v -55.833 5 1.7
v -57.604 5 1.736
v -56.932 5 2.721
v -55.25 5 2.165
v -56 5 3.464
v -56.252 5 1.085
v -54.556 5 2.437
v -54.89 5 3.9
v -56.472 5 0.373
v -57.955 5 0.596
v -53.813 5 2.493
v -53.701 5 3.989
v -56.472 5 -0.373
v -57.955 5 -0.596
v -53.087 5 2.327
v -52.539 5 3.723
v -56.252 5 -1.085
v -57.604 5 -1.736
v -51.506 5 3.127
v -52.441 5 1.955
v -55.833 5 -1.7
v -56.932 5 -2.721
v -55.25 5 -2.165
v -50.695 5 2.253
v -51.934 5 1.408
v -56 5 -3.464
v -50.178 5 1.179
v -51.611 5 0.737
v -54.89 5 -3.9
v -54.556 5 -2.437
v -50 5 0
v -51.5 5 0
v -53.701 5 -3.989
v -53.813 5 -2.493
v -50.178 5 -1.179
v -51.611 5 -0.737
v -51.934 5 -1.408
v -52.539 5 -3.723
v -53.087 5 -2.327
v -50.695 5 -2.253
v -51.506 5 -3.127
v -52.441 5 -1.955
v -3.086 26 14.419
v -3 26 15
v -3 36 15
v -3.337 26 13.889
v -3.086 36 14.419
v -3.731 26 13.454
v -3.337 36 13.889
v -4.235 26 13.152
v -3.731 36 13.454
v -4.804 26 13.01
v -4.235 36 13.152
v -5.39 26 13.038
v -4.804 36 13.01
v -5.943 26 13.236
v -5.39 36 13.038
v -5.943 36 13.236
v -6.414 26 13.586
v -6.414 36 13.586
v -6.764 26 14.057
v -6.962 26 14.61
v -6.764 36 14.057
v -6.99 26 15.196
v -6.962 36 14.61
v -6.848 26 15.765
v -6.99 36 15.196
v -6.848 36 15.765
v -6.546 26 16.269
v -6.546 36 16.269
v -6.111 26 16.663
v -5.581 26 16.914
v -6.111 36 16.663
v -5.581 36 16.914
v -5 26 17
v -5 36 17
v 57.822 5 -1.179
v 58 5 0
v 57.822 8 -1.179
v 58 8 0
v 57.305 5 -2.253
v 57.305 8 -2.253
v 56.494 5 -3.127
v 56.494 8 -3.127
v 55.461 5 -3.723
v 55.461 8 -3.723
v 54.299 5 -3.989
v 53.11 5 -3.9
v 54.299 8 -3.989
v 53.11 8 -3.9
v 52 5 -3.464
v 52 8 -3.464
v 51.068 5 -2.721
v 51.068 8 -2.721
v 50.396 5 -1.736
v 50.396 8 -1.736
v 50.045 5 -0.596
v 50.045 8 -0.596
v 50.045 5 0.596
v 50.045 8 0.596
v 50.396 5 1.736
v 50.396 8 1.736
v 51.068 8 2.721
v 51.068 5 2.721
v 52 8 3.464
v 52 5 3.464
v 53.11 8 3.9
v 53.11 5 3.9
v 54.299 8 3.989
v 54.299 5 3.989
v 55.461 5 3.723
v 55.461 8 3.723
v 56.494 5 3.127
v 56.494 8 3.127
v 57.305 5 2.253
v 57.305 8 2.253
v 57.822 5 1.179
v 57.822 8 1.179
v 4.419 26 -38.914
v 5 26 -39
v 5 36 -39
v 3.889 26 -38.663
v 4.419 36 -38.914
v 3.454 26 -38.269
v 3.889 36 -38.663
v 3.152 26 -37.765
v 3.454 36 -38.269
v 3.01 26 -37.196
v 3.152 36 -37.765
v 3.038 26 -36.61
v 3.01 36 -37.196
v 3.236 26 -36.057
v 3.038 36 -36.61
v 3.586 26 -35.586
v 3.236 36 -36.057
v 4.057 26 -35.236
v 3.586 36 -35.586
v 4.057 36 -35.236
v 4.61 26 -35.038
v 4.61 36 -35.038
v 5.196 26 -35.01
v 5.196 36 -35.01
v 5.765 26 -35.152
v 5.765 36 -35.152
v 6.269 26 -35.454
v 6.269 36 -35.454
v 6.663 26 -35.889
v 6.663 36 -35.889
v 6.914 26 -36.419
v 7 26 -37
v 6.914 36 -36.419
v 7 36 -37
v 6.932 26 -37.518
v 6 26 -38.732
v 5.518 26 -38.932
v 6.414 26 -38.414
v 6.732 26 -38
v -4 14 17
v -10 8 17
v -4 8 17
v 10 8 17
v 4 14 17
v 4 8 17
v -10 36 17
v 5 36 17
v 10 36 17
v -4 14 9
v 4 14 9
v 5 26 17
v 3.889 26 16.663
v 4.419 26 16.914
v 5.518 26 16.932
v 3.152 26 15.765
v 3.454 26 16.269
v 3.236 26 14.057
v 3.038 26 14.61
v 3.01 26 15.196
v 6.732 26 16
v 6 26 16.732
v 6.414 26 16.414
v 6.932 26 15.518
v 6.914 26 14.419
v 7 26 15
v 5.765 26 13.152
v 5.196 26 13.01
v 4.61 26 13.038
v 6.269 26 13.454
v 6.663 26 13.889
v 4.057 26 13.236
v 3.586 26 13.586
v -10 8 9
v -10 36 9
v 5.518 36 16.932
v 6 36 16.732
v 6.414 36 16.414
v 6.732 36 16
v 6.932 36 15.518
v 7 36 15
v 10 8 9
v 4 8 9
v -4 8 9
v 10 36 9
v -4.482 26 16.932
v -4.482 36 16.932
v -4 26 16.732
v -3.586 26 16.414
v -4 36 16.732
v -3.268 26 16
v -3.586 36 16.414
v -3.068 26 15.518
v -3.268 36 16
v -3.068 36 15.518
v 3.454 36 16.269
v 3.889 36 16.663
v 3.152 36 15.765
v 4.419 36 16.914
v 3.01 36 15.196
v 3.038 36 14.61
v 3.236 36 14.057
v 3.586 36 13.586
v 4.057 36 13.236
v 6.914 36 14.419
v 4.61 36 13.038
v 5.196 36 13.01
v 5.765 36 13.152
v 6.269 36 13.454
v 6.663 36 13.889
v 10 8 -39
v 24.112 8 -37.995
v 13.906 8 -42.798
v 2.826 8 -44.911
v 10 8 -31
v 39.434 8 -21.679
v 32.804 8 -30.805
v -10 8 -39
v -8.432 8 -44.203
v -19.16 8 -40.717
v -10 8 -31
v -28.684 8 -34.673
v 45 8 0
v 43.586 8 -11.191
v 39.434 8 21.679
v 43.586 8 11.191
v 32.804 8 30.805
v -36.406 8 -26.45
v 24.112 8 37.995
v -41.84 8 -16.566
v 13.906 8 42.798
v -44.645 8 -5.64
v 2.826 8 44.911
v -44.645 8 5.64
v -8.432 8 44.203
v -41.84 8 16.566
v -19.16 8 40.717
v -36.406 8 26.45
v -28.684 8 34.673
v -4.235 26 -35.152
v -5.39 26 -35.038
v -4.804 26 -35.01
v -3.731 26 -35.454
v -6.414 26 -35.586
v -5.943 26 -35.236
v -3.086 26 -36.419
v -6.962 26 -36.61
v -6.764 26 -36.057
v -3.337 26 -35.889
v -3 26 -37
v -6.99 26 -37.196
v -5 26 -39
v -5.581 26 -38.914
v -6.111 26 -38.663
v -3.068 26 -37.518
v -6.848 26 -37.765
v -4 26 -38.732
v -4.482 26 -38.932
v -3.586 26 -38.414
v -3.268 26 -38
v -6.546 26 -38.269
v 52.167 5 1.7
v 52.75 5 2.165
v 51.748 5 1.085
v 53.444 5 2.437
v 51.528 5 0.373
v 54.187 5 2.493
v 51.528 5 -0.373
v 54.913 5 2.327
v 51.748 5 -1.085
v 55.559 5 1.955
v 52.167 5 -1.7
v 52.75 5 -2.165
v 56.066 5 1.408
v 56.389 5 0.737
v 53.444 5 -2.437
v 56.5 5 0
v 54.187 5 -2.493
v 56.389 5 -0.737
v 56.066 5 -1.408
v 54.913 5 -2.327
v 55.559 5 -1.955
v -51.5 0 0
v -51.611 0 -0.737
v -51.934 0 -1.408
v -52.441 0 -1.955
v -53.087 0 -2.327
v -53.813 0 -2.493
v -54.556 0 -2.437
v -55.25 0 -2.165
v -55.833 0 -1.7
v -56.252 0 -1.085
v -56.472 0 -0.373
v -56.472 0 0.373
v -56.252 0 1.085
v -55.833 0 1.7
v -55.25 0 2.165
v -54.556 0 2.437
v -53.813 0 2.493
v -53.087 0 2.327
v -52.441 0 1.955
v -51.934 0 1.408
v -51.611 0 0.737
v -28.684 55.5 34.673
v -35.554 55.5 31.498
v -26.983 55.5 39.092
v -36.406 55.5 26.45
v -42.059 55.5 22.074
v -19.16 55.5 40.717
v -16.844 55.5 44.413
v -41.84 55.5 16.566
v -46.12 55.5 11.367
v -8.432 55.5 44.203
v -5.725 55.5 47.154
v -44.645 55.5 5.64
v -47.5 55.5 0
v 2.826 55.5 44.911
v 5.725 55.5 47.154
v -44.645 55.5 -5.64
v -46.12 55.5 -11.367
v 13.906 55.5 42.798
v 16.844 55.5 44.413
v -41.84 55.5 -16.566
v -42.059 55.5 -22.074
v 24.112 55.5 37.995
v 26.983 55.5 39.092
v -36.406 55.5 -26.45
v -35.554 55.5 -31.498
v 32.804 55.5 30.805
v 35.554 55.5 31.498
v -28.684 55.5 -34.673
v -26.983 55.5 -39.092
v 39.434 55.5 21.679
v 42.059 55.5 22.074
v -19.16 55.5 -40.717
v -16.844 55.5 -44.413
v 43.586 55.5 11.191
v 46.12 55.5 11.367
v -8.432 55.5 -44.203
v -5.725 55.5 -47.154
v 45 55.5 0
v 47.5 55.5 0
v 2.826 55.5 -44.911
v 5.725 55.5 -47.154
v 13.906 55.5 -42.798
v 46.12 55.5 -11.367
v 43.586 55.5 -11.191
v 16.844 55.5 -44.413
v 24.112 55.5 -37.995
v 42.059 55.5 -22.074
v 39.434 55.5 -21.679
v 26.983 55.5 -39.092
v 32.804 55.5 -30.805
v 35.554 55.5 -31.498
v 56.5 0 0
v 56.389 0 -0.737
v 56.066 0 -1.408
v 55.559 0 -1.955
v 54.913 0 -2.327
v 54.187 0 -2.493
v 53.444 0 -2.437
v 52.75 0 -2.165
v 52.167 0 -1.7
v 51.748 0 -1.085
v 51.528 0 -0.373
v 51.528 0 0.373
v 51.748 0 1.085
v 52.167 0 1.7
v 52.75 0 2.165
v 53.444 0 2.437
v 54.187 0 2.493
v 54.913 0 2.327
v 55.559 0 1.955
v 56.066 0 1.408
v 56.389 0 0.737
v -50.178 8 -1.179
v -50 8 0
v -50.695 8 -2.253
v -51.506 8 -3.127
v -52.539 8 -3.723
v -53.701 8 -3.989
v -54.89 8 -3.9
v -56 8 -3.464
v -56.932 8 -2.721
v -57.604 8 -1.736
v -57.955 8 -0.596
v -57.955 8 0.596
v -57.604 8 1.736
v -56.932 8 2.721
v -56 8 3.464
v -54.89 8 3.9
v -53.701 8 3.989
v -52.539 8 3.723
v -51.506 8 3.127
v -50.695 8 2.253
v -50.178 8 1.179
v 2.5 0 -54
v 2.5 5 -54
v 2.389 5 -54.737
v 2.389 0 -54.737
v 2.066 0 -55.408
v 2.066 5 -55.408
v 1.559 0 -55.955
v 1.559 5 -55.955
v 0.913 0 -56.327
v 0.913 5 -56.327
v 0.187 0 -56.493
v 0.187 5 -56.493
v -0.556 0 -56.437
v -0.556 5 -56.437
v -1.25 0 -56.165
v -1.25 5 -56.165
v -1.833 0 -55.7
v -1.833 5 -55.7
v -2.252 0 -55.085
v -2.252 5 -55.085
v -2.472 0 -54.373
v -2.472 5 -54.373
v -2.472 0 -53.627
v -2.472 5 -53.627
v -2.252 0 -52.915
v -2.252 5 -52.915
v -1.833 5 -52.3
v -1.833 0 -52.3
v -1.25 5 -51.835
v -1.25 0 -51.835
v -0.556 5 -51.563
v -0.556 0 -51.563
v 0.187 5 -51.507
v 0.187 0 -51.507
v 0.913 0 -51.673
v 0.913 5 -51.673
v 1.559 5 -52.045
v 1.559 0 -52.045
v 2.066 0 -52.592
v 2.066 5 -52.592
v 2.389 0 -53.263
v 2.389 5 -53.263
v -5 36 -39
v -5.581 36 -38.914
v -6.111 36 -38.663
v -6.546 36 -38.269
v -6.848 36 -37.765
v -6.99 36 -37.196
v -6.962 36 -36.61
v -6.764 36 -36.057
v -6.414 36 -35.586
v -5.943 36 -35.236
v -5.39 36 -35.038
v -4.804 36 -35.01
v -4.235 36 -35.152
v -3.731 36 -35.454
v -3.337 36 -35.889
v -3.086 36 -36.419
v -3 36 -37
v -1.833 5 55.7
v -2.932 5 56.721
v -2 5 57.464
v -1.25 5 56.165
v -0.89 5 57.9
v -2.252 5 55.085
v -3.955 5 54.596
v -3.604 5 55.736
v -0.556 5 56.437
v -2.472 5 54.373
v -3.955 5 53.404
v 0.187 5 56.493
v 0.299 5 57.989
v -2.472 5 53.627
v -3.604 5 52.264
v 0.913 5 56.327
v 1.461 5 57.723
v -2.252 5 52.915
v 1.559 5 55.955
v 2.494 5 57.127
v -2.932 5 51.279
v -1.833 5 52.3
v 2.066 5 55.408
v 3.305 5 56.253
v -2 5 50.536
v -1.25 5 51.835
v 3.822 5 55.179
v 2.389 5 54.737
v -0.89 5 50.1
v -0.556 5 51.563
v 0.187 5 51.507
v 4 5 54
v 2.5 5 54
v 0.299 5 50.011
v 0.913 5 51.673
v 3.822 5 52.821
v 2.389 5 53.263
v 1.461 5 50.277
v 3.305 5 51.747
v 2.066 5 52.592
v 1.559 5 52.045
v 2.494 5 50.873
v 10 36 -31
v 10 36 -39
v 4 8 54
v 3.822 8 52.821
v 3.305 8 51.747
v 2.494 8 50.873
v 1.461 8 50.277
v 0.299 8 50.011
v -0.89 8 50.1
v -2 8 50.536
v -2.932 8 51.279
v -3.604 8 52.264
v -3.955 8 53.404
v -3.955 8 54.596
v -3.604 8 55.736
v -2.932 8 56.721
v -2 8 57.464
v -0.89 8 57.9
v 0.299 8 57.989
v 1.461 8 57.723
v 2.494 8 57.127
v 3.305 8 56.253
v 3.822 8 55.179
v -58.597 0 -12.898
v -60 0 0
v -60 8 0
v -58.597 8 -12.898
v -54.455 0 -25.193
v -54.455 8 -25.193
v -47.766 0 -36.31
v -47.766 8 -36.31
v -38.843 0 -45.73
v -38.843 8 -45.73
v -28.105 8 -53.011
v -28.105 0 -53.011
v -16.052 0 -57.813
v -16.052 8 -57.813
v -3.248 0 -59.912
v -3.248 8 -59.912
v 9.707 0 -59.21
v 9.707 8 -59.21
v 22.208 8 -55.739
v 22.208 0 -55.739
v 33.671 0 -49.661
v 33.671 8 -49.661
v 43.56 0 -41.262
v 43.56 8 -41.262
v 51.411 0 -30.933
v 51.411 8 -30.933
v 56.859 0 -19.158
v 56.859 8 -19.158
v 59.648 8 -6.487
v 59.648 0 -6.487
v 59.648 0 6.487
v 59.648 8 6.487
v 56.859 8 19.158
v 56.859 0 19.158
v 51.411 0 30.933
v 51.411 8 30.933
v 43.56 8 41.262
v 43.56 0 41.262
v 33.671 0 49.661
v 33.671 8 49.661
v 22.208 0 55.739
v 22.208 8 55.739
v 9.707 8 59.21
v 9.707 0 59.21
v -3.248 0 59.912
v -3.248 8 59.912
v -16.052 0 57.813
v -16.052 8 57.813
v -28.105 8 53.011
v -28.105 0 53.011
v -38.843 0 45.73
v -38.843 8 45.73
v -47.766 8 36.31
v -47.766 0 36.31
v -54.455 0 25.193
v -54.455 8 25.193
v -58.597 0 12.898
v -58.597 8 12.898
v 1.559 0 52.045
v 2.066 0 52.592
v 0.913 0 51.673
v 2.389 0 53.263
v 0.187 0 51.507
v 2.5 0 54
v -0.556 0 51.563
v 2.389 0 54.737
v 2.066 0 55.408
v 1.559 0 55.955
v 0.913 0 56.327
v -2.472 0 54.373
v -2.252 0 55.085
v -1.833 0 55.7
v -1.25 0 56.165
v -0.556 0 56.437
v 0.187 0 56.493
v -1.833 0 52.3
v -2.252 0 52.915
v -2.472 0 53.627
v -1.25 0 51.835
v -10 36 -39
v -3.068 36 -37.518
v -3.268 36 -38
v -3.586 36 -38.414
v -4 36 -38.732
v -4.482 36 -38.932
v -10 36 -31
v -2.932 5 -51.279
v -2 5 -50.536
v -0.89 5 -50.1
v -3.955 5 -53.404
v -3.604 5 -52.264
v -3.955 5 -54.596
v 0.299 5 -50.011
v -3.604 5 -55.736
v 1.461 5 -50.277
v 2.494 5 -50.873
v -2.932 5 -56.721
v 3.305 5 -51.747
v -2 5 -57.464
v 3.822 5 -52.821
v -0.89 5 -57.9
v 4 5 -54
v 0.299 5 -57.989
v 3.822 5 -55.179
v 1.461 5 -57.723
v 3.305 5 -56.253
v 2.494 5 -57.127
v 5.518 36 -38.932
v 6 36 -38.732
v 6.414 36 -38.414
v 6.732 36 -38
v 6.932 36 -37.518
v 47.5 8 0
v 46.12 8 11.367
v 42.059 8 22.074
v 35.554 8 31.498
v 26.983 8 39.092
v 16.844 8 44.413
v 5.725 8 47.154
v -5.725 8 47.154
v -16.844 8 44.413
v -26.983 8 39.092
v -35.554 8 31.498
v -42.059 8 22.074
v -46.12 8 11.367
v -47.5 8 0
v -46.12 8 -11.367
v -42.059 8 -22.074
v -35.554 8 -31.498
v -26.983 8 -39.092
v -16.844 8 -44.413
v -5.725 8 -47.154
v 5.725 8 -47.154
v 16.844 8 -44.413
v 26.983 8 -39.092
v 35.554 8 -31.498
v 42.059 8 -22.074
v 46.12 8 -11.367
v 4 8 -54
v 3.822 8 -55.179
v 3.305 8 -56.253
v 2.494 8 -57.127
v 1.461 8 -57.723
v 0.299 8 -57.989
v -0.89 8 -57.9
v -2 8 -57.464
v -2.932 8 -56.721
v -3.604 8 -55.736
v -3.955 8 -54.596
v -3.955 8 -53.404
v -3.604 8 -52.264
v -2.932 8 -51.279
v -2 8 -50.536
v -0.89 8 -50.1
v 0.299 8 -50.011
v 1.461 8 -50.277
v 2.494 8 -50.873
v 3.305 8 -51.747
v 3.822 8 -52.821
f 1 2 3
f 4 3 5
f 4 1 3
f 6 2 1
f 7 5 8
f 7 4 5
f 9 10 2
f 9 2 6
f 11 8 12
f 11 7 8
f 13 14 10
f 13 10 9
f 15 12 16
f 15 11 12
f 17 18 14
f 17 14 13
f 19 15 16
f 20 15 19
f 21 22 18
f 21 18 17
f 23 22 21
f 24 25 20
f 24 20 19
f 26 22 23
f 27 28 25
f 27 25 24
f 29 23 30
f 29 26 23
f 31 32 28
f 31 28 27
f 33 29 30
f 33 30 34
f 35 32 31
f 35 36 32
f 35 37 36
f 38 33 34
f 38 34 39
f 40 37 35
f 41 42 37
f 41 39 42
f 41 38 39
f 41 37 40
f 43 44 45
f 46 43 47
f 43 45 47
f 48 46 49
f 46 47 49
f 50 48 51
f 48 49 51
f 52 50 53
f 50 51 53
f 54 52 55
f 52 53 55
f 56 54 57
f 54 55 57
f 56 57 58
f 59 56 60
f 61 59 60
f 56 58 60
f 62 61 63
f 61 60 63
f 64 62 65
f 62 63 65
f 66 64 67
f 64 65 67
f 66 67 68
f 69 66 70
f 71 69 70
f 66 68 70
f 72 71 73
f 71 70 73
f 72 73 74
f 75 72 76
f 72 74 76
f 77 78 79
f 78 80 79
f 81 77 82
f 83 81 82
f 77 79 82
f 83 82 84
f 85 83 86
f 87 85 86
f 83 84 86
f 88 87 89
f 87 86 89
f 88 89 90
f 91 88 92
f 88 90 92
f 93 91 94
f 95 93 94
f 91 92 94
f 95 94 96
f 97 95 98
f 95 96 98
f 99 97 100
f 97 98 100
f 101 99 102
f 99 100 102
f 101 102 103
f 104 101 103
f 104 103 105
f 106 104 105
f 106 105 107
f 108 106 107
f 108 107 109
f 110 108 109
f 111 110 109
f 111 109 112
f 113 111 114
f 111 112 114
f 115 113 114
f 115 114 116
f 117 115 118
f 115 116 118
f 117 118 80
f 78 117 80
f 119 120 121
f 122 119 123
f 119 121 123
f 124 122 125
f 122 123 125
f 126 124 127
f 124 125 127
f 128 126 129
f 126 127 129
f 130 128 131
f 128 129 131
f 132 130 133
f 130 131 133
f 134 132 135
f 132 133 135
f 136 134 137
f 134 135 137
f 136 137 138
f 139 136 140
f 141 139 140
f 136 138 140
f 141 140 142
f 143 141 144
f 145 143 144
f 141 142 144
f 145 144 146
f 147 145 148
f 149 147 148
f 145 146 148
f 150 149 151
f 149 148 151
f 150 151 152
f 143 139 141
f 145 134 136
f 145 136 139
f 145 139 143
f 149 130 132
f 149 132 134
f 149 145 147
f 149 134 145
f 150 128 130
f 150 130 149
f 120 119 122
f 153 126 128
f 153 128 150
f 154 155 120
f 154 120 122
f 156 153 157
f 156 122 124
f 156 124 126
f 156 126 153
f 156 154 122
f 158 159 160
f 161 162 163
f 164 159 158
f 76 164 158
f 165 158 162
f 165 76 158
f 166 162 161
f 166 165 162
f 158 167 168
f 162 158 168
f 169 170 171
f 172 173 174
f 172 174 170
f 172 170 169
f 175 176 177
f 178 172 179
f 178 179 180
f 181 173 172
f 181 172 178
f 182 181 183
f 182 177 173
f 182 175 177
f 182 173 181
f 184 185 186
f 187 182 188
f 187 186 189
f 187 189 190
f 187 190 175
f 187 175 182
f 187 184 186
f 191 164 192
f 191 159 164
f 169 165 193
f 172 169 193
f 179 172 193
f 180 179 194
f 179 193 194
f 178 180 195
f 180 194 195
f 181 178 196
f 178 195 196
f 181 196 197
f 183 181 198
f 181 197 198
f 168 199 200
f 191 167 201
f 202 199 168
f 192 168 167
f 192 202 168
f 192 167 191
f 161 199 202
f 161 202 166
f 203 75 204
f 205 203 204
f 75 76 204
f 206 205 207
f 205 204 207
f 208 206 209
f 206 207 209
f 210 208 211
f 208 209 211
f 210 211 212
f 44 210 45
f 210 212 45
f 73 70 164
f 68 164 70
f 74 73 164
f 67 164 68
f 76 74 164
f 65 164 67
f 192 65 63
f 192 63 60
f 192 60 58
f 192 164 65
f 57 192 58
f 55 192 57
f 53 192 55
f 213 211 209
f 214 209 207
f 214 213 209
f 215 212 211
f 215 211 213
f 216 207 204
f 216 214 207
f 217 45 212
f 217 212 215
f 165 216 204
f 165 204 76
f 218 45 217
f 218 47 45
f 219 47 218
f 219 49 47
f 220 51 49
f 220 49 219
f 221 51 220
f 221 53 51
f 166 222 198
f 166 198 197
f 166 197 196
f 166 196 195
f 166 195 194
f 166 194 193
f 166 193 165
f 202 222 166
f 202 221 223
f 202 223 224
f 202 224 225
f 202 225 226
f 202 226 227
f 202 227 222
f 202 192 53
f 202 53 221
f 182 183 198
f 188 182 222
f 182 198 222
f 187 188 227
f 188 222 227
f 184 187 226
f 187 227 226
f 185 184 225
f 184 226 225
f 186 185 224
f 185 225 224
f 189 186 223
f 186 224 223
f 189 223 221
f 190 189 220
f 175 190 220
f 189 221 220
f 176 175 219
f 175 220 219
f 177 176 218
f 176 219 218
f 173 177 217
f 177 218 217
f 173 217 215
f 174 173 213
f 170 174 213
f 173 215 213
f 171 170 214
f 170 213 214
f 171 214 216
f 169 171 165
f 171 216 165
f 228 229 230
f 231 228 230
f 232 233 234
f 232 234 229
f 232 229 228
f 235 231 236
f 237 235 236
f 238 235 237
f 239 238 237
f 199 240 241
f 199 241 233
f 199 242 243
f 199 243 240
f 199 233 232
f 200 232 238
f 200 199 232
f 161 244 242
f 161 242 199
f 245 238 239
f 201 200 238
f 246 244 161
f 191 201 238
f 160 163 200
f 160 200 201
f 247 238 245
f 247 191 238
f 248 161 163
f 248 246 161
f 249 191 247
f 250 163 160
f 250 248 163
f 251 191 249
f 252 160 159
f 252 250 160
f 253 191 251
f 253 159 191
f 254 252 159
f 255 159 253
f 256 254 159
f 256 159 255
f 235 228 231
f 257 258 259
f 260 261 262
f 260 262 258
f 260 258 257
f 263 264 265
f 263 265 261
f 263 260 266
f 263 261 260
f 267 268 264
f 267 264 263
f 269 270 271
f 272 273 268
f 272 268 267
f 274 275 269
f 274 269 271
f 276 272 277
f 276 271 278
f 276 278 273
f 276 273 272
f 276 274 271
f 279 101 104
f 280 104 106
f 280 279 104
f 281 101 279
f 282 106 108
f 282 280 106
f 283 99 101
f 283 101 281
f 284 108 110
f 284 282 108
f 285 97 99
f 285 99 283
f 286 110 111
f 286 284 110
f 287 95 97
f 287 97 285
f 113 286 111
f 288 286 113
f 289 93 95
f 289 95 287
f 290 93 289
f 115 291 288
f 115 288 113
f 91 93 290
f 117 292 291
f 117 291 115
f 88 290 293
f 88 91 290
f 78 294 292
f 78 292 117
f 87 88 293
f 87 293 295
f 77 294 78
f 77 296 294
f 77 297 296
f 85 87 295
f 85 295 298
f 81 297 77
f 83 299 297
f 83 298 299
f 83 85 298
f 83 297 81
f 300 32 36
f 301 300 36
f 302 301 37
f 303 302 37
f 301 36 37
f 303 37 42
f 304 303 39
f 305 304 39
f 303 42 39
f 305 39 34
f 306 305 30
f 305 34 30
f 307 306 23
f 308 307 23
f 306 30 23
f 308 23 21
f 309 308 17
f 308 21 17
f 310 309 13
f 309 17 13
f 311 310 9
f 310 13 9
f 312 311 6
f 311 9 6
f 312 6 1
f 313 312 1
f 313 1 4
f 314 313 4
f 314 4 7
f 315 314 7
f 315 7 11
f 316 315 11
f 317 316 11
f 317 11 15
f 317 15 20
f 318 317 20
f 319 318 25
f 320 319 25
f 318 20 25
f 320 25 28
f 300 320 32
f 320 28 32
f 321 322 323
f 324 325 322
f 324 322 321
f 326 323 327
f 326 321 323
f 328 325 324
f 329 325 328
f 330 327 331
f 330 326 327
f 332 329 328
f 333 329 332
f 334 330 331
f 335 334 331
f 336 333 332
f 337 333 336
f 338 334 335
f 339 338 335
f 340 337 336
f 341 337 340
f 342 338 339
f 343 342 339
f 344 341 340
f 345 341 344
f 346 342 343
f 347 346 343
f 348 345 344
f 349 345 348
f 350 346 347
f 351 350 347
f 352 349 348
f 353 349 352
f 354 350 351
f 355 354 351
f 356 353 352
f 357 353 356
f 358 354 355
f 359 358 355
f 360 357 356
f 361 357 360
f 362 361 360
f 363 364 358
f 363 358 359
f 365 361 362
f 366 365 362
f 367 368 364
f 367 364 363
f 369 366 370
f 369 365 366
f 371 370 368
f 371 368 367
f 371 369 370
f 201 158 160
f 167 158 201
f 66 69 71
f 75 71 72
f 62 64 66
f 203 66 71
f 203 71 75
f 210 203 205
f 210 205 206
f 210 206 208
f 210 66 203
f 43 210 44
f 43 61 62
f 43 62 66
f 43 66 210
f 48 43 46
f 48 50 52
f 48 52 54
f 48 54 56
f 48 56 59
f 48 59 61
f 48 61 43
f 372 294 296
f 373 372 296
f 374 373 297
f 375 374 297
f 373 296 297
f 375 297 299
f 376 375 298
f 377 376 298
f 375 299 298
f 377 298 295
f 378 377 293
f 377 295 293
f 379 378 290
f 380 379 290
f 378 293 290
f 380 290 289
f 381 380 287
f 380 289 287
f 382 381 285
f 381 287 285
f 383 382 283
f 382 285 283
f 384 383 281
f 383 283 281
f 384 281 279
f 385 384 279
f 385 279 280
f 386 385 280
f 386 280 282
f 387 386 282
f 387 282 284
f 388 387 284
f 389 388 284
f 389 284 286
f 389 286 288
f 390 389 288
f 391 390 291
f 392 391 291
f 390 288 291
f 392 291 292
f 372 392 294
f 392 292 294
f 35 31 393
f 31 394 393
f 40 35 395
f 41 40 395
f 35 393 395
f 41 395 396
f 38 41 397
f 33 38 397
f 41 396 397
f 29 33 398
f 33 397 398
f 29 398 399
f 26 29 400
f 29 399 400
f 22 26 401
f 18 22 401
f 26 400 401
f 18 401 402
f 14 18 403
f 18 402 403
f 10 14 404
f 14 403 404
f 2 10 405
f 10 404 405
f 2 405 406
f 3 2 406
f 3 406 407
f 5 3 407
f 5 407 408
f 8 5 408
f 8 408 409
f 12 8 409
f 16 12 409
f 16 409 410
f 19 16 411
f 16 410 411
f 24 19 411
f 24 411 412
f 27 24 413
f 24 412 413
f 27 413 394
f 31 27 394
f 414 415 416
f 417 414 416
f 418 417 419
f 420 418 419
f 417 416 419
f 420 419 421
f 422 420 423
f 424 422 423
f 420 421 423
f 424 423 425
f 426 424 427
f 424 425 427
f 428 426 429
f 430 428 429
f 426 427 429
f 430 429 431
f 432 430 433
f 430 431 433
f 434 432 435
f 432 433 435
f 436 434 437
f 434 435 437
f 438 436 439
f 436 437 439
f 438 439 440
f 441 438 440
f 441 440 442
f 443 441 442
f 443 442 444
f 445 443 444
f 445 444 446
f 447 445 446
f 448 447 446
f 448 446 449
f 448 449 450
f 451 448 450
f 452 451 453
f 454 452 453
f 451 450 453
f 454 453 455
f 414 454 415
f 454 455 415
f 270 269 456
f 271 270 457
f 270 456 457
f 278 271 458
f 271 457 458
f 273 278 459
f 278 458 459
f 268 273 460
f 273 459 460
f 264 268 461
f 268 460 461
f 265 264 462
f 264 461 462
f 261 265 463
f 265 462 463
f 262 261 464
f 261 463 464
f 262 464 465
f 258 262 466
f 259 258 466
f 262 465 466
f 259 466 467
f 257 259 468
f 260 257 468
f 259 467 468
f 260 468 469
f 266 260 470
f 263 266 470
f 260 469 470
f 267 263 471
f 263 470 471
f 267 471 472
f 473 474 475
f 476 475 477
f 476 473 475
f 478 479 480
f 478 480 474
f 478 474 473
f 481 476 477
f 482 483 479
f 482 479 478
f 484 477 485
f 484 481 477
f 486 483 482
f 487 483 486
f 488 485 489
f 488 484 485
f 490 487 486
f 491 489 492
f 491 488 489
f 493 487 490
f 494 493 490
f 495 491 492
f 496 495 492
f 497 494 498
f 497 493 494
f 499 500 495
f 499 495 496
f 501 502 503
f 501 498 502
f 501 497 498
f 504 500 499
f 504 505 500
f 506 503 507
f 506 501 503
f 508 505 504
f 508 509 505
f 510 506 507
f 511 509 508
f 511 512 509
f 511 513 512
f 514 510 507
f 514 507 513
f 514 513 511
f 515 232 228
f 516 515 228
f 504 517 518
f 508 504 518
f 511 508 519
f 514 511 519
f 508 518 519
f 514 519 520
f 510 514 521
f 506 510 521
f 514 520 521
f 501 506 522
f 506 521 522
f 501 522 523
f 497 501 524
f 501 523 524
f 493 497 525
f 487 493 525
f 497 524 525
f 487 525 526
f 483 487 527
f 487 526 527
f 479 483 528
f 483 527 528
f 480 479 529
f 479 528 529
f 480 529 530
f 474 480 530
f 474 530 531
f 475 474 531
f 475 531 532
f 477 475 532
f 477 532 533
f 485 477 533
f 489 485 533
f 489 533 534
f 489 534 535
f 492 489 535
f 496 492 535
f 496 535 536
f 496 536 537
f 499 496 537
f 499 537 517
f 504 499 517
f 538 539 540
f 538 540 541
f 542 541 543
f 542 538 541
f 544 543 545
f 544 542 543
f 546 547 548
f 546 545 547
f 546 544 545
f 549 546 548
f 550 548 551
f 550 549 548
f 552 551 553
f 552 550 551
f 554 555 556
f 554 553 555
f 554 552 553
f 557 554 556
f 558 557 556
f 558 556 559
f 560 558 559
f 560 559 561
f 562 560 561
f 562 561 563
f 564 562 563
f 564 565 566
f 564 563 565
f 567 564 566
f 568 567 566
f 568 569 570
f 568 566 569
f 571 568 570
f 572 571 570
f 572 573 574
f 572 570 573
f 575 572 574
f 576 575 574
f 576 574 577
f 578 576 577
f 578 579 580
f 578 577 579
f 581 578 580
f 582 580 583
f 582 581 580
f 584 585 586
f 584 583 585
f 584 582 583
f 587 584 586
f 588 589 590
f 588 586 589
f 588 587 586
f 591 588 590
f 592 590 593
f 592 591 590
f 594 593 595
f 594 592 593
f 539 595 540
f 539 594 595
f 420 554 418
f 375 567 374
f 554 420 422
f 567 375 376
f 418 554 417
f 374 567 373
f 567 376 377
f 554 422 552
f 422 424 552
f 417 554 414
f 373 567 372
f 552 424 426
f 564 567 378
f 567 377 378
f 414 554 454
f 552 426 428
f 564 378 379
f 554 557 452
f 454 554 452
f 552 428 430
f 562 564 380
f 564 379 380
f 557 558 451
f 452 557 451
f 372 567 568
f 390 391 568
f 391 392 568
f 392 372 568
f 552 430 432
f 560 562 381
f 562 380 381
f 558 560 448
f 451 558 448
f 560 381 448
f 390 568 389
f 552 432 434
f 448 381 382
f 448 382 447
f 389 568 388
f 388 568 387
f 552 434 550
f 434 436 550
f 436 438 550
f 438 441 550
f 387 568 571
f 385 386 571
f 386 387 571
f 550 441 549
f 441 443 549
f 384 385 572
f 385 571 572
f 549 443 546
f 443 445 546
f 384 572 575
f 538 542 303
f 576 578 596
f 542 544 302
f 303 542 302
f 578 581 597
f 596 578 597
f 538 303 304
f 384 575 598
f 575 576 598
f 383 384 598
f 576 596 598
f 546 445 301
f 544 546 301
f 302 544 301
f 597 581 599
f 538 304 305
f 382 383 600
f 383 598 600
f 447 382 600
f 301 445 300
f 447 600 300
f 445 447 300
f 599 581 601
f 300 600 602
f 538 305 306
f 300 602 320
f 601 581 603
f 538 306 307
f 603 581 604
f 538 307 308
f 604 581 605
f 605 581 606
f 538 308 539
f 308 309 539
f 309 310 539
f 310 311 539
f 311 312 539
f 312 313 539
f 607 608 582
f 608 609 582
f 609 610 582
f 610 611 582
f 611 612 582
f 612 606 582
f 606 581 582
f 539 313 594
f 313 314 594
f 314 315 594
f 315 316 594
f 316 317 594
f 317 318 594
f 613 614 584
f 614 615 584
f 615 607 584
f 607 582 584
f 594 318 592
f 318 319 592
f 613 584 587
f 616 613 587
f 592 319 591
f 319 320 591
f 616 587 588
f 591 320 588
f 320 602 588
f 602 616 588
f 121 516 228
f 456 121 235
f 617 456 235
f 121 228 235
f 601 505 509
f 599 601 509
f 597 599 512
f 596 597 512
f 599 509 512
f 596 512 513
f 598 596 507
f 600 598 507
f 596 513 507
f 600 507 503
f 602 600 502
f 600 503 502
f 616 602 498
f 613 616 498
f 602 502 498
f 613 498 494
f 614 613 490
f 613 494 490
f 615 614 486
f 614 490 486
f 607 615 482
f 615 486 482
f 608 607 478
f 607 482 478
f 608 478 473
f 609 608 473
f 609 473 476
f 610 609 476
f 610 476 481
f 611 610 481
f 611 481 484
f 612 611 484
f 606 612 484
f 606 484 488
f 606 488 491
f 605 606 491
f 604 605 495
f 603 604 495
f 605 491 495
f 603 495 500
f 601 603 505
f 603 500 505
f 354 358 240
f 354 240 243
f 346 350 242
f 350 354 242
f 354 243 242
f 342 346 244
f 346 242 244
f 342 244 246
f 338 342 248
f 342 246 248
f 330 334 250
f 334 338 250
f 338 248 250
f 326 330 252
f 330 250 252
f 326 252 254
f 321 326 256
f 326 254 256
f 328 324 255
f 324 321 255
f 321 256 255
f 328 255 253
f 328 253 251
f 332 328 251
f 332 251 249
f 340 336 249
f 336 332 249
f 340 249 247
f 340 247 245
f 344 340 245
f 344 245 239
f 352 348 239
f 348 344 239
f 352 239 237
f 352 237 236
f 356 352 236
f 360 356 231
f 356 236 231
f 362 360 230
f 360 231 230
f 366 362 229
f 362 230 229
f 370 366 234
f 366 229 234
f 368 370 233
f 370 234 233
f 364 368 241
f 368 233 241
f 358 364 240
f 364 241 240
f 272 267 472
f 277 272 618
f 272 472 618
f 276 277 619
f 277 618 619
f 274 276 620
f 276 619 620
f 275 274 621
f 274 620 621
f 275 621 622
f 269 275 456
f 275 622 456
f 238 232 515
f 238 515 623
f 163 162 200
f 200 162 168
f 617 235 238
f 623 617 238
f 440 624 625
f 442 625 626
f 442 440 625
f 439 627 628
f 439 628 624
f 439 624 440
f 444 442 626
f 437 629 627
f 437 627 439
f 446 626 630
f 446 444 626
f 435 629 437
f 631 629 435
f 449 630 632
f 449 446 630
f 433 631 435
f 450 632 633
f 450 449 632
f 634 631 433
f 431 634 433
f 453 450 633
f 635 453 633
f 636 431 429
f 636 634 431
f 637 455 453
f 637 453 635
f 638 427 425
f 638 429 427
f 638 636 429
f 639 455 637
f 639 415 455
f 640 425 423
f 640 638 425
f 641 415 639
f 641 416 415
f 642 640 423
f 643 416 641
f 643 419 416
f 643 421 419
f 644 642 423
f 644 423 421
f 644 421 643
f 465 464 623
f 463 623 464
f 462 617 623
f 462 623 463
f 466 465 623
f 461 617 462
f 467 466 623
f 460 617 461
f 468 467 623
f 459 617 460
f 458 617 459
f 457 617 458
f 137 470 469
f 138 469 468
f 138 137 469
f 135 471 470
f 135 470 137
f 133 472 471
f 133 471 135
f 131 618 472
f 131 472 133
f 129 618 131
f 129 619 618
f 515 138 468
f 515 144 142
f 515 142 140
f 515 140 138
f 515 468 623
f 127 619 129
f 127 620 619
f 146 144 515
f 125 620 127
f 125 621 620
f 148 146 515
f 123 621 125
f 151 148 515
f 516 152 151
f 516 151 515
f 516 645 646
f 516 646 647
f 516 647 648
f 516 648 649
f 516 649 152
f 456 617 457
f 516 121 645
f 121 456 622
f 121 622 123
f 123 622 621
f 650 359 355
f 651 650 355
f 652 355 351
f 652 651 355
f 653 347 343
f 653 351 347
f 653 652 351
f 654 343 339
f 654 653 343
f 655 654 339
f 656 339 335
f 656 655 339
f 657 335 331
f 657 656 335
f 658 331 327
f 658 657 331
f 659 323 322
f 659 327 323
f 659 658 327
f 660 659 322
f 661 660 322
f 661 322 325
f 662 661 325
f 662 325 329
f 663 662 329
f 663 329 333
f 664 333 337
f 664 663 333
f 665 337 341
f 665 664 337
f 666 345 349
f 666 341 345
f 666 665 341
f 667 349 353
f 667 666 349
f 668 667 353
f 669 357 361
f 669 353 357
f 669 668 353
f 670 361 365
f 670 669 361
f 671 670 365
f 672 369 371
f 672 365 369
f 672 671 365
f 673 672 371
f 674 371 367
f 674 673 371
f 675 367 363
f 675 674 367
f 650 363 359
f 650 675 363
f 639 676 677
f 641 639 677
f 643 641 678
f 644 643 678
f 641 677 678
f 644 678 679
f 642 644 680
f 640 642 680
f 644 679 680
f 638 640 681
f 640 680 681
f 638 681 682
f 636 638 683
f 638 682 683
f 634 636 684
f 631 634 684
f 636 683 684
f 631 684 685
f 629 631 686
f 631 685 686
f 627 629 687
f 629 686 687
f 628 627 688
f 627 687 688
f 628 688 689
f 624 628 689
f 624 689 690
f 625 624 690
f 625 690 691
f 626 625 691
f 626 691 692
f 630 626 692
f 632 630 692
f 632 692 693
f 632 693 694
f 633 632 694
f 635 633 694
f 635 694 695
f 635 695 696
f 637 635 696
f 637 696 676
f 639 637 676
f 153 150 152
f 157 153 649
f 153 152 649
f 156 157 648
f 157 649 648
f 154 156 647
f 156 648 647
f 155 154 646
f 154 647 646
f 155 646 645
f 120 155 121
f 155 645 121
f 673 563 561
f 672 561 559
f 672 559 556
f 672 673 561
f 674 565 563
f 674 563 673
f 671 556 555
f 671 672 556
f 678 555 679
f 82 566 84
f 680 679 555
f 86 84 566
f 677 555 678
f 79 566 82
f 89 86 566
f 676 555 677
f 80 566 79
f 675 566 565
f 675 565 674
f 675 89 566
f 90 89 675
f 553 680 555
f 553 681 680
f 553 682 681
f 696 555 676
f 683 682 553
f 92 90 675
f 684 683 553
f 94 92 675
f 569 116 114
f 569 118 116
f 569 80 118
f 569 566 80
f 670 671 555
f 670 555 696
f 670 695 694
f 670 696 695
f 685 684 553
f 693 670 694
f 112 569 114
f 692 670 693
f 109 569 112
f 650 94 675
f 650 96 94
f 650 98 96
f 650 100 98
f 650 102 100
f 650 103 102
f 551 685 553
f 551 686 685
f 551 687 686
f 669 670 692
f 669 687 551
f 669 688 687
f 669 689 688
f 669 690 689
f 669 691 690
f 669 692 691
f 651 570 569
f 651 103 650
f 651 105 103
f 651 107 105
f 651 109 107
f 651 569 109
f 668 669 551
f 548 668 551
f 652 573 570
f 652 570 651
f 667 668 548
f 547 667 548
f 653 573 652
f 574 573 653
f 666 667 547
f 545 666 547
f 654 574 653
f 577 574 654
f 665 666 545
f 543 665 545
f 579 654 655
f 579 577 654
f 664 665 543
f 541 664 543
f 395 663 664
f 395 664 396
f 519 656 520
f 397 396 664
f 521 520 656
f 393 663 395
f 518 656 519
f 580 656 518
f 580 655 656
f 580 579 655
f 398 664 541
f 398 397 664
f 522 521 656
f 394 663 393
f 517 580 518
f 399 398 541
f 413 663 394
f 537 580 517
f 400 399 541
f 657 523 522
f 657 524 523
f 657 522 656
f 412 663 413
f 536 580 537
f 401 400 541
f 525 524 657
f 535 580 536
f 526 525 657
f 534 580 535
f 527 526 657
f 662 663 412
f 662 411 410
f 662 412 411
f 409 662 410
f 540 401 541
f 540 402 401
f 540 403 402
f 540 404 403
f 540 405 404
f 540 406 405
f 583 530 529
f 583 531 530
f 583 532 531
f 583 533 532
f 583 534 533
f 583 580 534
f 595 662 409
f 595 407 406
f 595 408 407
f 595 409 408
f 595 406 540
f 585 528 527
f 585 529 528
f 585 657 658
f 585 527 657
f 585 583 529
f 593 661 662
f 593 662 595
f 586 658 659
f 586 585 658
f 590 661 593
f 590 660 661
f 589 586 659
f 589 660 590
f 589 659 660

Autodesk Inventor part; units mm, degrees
ref_plane "YZ Plane" through (0, 0, 0) normal (1, 0, 0) x (0, 1, 0)
ref_plane "XZ Plane" through (0, 0, 0) normal (0, 1, 0) x (-1, 0, 0)
ref_plane "XY Plane" through (0, 0, 0) normal (0, 0, 1) x (1, 0, 0)
sketch "Sketch1" plane through (0, 0, 0) normal (0, 1, 0) x (-1, 0, 0)
  circle A0 centre (0, 0) radius 60
  dimension "d0" = 120
extrude "Extrusion1" add sketch "Sketch1" along normal blind 8
sketch "Sketch2" plane through (0, 8, 0) normal (0, 1, 0) x (1, 0, 0)
  circle A0 centre (-54, 0) radius 4
  circle A1 centre (-54, 0) radius 2.5
  circle A2 centre (0, -54) radius 4
  circle A3 centre (0, -54) radius 2.5
  circle A4 centre (54, 0) radius 4
  circle A5 centre (54, 0) radius 2.5
  circle A6 centre (0, 54) radius 4
  circle A7 centre (0, 54) radius 2.5
  point P0 (0, 0)
  dimension "d3" = 8
  dimension "d4" = 5
  dimension "d5" = 8
  dimension "d6" = 5
  dimension "d7" = 8
  dimension "d8" = 5
  dimension "d9" = 8
  dimension "d10" = 5
extrude "Extrusion2" cut sketch "Sketch2" against normal blind 8 contours A1 | A3 | A5 | A7
sketch "Sketch3" plane through (0, 8, 0) normal (0, 1, 0) x (1, 0, 0)
  circle A0 centre (-54, 0) radius 2.5 projected
  circle A1 centre (-54, 0) radius 4
  circle A2 centre (-54, 0) radius 2.5
  circle A3 centre (0, 54) radius 2.5 projected
  circle A4 centre (0, 54) radius 4
  circle A5 centre (0, 54) radius 2.5
  circle A6 centre (54, 0) radius 2.5 projected
  circle A7 centre (54, 0) radius 4
  circle A8 centre (54, 0) radius 2.5
  circle A9 centre (0, -54) radius 4
  circle A10 centre (0, -54) radius 2.5
  point P0 (0, 0)
  dimension "d13" = 8
  dimension "d14" = 8
  dimension "d15" = 5
  dimension "d16" = 8
  dimension "d17" = 5
  dimension "d18" = 8
extrude "Extrusion3" cut sketch "Sketch3" against normal blind 3
sketch "Sketch4" plane through (0, 8, 0) normal (0, 1, 0) x (1, 0, 0)
  circle A0 centre (0, 0) radius 47.5
  circle A1 centre (0, 0) radius 45
  line L0 (0, 0) -> (-10, 0)
  line L1 (-10, 0) -> (-10, -9)
  line L2 (-10, -9) -> (0, -9)
  line L3 (0, -9) -> (0, 0)
  line L4 (0, -9) -> (10, -9)
  line L5 (10, -9) -> (10, 0)
  line L6 (10, 0) -> (0, 0)
  line L7 (0, 0) -> (0, -9)
  line L8 (-10, -9) -> (10, -9)
  line L9 (10, -9) -> (10, -16)
  line L10 (10, -16) -> (-10, -16)
  line L11 (-10, -16) -> (-10, -9)
  dimension "d21" = 95
  dimension "d22" = 90
  dimension "d23" = 10
  dimension "d24" = 9
  dimension "d25" = 10
  dimension "d26" = 7
extrude "Extrusion4" add sketch "Sketch4" along normal blind 47.5 contours A0
sketch "Sketch5" plane through (0, 8, 0) normal (0, 1, 0) x (1, 0, 0)
  line L0 (0, 0) -> (-10, 0)
  line L1 (-10, 0) -> (-10, -9)
  line L2 (-10, -9) -> (0, -9)
  line L3 (0, -9) -> (0, 0)
  line L4 (-10, -9) -> (10, -9)
  line L5 (10, -9) -> (10, -16)
  line L6 (10, -16) -> (-10, -16)
  line L7 (-10, -16) -> (-10, -9)
  line L8 (-10, -9) -> (10, -9)
  line L9 (10, -9) -> (10, 31)
  line L10 (10, 31) -> (-10, 31)
  line L11 (-10, 31) -> (-10, -9)
  line L12 (-10, 31) -> (-2, 31)
  line L13 (-2, 31) -> (-2, 38.36)
  line L14 (-2, 38.36) -> (-10, 38.36)
  line L15 (-10, 38.36) -> (-10, 31)
  line L16 (-10, 31) -> (10, 31)
  line L17 (10, 31) -> (10, 39)
  line L18 (10, 39) -> (-10, 39)
  line L19 (-10, 39) -> (-10, 31)
  line L20 (-10, -9) -> (10, -9)
  line L21 (10, -9) -> (10, -17)
  line L22 (10, -17) -> (-10, -17)
  line L23 (-10, -17) -> (-10, -9)
  dimension "d29" = 10
  dimension "d30" = 9
  dimension "d31" = 20
  dimension "d32" = 7
  dimension "d33" = 40
  dimension "d34" = 8
  dimension "d35" = 8
  dimension "d36" = 8
extrude "Extrusion5" add sketch "Sketch5" along normal blind 28 contours L4 L5 L6 L7 L2 | L15 L14 L13 L10 | L6 L21 L22 L23 | L13 L14 L19 L18 L17 L10
sketch "Sketch6" plane through (0, 36, 0) normal (0, 1, 0) x (1, 0, 0)
  line L0 (10, -17) -> (-10, -17) projected
  line L1 (-10, -9) -> (10, -9) projected
  line L2 (0, -17) -> (-4, -17)
  line L3 (-4, -17) -> (-4, -9)
  line L4 (-4, -9) -> (0, -9)
  line L5 (0, -9) -> (0, -17)
  line L6 (0, -17) -> (4, -17)
  line L7 (4, -17) -> (4, -9)
  line L8 (4, -9) -> (0, -9)
  line L9 (0, -9) -> (0, -17)
  point P0 (0, 0)
  dimension "d39" = 4
  dimension "d40" = 4
extrude "Extrusion6" cut sketch "Sketch6" against normal blind 28
sketch "Sketch7" plane through (0, 36, 0) normal (0, 1, 0) x (1, 0, 0)
  line L0 (-10, -17) -> (-4, -17) projected
  line L1 (4, -9) -> (10, -9) projected
  line L2 (-4, -17) -> (4, -17)
  line L3 (4, -17) -> (4, -9)
  line L4 (4, -9) -> (-4, -9)
  line L5 (-4, -9) -> (-4, -17)
  point P0 (0, 0)
extrude "Extrusion7" add sketch "Sketch7" against normal blind 22
sketch "Sketch8" plane through (0, 36, 0) normal (0, 1, 0) x (1, 0, 0)
  line L0 (-4, -17) -> (-10, -17) projected
  line L1 (10, -17) -> (10, -9) projected
  line L2 (-10, -17) -> (10, -17)
  line L3 (10, -17) -> (10, -15)
  line L4 (10, -15) -> (-10, -15)
  line L5 (-10, -15) -> (-10, -17)
  line L6 (-4, -9) -> (4, -9) projected
  line L7 (0, -9) -> (-5, -9)
  line L8 (-5, -9) -> (-5, -17)
  line L9 (-5, -17) -> (0, -17)
  line L10 (0, -17) -> (0, -9)
  line L11 (-10, -17) -> (10, -17) projected
  line L12 (0, -9) -> (5, -9)
  line L13 (5, -9) -> (5, -17)
  line L14 (5, -17) -> (0, -17)
  line L15 (0, -17) -> (0, -9)
  circle A0 centre (-5, -15) radius 2
  circle A1 centre (5, -15) radius 2
  line L16 (-10, 31) -> (-10, 39) projected
  line L17 (10, 39) -> (10, 31) projected
  line L18 (-10, 39) -> (10, 39)
  line L19 (10, 39) -> (10, 37)
  line L20 (10, 37) -> (-10, 37)
  line L21 (-10, 37) -> (-10, 39)
  line L22 (10, 31) -> (-10, 31) projected
  line L23 (-10, 39) -> (10, 39) projected
  line L24 (0, 31) -> (-5, 31)
  line L25 (-5, 31) -> (-5, 39)
  line L26 (-5, 39) -> (0, 39)
  line L27 (0, 39) -> (0, 31)
  line L28 (0, 31) -> (5, 31)
  line L29 (5, 31) -> (5, 39)
  line L30 (5, 39) -> (0, 39)
  line L31 (0, 39) -> (0, 31)
  circle A2 centre (-5, 37) radius 2
  circle A3 centre (5, 37) radius 2
  point P0 (0, 0)
  dimension "d45" = 2
  dimension "d46" = 5
  dimension "d47" = 5
  dimension "d48" = 4
  dimension "d49" = 4
  dimension "d50" = 2
  dimension "d51" = 4
  dimension "d52" = 4
extrude "Extrusion8" cut sketch "Sketch8" against normal blind 10 contours A0 L4 L8 | L8 L4 A0 | L8 A0 L4 | L4 A0 L8 | A1 L4 L13 | L13 L4 A1 | L13 A1 L4 | L4 A1 L13 | A2 L25 L20 | L20 L25 A2 | L25 L20 A2 | A2 L20 L25 | A3 L20 L29 | L29 L20 A3 | A3 L29 L20 | A3 L20 L29
properties part number "Base Part"
